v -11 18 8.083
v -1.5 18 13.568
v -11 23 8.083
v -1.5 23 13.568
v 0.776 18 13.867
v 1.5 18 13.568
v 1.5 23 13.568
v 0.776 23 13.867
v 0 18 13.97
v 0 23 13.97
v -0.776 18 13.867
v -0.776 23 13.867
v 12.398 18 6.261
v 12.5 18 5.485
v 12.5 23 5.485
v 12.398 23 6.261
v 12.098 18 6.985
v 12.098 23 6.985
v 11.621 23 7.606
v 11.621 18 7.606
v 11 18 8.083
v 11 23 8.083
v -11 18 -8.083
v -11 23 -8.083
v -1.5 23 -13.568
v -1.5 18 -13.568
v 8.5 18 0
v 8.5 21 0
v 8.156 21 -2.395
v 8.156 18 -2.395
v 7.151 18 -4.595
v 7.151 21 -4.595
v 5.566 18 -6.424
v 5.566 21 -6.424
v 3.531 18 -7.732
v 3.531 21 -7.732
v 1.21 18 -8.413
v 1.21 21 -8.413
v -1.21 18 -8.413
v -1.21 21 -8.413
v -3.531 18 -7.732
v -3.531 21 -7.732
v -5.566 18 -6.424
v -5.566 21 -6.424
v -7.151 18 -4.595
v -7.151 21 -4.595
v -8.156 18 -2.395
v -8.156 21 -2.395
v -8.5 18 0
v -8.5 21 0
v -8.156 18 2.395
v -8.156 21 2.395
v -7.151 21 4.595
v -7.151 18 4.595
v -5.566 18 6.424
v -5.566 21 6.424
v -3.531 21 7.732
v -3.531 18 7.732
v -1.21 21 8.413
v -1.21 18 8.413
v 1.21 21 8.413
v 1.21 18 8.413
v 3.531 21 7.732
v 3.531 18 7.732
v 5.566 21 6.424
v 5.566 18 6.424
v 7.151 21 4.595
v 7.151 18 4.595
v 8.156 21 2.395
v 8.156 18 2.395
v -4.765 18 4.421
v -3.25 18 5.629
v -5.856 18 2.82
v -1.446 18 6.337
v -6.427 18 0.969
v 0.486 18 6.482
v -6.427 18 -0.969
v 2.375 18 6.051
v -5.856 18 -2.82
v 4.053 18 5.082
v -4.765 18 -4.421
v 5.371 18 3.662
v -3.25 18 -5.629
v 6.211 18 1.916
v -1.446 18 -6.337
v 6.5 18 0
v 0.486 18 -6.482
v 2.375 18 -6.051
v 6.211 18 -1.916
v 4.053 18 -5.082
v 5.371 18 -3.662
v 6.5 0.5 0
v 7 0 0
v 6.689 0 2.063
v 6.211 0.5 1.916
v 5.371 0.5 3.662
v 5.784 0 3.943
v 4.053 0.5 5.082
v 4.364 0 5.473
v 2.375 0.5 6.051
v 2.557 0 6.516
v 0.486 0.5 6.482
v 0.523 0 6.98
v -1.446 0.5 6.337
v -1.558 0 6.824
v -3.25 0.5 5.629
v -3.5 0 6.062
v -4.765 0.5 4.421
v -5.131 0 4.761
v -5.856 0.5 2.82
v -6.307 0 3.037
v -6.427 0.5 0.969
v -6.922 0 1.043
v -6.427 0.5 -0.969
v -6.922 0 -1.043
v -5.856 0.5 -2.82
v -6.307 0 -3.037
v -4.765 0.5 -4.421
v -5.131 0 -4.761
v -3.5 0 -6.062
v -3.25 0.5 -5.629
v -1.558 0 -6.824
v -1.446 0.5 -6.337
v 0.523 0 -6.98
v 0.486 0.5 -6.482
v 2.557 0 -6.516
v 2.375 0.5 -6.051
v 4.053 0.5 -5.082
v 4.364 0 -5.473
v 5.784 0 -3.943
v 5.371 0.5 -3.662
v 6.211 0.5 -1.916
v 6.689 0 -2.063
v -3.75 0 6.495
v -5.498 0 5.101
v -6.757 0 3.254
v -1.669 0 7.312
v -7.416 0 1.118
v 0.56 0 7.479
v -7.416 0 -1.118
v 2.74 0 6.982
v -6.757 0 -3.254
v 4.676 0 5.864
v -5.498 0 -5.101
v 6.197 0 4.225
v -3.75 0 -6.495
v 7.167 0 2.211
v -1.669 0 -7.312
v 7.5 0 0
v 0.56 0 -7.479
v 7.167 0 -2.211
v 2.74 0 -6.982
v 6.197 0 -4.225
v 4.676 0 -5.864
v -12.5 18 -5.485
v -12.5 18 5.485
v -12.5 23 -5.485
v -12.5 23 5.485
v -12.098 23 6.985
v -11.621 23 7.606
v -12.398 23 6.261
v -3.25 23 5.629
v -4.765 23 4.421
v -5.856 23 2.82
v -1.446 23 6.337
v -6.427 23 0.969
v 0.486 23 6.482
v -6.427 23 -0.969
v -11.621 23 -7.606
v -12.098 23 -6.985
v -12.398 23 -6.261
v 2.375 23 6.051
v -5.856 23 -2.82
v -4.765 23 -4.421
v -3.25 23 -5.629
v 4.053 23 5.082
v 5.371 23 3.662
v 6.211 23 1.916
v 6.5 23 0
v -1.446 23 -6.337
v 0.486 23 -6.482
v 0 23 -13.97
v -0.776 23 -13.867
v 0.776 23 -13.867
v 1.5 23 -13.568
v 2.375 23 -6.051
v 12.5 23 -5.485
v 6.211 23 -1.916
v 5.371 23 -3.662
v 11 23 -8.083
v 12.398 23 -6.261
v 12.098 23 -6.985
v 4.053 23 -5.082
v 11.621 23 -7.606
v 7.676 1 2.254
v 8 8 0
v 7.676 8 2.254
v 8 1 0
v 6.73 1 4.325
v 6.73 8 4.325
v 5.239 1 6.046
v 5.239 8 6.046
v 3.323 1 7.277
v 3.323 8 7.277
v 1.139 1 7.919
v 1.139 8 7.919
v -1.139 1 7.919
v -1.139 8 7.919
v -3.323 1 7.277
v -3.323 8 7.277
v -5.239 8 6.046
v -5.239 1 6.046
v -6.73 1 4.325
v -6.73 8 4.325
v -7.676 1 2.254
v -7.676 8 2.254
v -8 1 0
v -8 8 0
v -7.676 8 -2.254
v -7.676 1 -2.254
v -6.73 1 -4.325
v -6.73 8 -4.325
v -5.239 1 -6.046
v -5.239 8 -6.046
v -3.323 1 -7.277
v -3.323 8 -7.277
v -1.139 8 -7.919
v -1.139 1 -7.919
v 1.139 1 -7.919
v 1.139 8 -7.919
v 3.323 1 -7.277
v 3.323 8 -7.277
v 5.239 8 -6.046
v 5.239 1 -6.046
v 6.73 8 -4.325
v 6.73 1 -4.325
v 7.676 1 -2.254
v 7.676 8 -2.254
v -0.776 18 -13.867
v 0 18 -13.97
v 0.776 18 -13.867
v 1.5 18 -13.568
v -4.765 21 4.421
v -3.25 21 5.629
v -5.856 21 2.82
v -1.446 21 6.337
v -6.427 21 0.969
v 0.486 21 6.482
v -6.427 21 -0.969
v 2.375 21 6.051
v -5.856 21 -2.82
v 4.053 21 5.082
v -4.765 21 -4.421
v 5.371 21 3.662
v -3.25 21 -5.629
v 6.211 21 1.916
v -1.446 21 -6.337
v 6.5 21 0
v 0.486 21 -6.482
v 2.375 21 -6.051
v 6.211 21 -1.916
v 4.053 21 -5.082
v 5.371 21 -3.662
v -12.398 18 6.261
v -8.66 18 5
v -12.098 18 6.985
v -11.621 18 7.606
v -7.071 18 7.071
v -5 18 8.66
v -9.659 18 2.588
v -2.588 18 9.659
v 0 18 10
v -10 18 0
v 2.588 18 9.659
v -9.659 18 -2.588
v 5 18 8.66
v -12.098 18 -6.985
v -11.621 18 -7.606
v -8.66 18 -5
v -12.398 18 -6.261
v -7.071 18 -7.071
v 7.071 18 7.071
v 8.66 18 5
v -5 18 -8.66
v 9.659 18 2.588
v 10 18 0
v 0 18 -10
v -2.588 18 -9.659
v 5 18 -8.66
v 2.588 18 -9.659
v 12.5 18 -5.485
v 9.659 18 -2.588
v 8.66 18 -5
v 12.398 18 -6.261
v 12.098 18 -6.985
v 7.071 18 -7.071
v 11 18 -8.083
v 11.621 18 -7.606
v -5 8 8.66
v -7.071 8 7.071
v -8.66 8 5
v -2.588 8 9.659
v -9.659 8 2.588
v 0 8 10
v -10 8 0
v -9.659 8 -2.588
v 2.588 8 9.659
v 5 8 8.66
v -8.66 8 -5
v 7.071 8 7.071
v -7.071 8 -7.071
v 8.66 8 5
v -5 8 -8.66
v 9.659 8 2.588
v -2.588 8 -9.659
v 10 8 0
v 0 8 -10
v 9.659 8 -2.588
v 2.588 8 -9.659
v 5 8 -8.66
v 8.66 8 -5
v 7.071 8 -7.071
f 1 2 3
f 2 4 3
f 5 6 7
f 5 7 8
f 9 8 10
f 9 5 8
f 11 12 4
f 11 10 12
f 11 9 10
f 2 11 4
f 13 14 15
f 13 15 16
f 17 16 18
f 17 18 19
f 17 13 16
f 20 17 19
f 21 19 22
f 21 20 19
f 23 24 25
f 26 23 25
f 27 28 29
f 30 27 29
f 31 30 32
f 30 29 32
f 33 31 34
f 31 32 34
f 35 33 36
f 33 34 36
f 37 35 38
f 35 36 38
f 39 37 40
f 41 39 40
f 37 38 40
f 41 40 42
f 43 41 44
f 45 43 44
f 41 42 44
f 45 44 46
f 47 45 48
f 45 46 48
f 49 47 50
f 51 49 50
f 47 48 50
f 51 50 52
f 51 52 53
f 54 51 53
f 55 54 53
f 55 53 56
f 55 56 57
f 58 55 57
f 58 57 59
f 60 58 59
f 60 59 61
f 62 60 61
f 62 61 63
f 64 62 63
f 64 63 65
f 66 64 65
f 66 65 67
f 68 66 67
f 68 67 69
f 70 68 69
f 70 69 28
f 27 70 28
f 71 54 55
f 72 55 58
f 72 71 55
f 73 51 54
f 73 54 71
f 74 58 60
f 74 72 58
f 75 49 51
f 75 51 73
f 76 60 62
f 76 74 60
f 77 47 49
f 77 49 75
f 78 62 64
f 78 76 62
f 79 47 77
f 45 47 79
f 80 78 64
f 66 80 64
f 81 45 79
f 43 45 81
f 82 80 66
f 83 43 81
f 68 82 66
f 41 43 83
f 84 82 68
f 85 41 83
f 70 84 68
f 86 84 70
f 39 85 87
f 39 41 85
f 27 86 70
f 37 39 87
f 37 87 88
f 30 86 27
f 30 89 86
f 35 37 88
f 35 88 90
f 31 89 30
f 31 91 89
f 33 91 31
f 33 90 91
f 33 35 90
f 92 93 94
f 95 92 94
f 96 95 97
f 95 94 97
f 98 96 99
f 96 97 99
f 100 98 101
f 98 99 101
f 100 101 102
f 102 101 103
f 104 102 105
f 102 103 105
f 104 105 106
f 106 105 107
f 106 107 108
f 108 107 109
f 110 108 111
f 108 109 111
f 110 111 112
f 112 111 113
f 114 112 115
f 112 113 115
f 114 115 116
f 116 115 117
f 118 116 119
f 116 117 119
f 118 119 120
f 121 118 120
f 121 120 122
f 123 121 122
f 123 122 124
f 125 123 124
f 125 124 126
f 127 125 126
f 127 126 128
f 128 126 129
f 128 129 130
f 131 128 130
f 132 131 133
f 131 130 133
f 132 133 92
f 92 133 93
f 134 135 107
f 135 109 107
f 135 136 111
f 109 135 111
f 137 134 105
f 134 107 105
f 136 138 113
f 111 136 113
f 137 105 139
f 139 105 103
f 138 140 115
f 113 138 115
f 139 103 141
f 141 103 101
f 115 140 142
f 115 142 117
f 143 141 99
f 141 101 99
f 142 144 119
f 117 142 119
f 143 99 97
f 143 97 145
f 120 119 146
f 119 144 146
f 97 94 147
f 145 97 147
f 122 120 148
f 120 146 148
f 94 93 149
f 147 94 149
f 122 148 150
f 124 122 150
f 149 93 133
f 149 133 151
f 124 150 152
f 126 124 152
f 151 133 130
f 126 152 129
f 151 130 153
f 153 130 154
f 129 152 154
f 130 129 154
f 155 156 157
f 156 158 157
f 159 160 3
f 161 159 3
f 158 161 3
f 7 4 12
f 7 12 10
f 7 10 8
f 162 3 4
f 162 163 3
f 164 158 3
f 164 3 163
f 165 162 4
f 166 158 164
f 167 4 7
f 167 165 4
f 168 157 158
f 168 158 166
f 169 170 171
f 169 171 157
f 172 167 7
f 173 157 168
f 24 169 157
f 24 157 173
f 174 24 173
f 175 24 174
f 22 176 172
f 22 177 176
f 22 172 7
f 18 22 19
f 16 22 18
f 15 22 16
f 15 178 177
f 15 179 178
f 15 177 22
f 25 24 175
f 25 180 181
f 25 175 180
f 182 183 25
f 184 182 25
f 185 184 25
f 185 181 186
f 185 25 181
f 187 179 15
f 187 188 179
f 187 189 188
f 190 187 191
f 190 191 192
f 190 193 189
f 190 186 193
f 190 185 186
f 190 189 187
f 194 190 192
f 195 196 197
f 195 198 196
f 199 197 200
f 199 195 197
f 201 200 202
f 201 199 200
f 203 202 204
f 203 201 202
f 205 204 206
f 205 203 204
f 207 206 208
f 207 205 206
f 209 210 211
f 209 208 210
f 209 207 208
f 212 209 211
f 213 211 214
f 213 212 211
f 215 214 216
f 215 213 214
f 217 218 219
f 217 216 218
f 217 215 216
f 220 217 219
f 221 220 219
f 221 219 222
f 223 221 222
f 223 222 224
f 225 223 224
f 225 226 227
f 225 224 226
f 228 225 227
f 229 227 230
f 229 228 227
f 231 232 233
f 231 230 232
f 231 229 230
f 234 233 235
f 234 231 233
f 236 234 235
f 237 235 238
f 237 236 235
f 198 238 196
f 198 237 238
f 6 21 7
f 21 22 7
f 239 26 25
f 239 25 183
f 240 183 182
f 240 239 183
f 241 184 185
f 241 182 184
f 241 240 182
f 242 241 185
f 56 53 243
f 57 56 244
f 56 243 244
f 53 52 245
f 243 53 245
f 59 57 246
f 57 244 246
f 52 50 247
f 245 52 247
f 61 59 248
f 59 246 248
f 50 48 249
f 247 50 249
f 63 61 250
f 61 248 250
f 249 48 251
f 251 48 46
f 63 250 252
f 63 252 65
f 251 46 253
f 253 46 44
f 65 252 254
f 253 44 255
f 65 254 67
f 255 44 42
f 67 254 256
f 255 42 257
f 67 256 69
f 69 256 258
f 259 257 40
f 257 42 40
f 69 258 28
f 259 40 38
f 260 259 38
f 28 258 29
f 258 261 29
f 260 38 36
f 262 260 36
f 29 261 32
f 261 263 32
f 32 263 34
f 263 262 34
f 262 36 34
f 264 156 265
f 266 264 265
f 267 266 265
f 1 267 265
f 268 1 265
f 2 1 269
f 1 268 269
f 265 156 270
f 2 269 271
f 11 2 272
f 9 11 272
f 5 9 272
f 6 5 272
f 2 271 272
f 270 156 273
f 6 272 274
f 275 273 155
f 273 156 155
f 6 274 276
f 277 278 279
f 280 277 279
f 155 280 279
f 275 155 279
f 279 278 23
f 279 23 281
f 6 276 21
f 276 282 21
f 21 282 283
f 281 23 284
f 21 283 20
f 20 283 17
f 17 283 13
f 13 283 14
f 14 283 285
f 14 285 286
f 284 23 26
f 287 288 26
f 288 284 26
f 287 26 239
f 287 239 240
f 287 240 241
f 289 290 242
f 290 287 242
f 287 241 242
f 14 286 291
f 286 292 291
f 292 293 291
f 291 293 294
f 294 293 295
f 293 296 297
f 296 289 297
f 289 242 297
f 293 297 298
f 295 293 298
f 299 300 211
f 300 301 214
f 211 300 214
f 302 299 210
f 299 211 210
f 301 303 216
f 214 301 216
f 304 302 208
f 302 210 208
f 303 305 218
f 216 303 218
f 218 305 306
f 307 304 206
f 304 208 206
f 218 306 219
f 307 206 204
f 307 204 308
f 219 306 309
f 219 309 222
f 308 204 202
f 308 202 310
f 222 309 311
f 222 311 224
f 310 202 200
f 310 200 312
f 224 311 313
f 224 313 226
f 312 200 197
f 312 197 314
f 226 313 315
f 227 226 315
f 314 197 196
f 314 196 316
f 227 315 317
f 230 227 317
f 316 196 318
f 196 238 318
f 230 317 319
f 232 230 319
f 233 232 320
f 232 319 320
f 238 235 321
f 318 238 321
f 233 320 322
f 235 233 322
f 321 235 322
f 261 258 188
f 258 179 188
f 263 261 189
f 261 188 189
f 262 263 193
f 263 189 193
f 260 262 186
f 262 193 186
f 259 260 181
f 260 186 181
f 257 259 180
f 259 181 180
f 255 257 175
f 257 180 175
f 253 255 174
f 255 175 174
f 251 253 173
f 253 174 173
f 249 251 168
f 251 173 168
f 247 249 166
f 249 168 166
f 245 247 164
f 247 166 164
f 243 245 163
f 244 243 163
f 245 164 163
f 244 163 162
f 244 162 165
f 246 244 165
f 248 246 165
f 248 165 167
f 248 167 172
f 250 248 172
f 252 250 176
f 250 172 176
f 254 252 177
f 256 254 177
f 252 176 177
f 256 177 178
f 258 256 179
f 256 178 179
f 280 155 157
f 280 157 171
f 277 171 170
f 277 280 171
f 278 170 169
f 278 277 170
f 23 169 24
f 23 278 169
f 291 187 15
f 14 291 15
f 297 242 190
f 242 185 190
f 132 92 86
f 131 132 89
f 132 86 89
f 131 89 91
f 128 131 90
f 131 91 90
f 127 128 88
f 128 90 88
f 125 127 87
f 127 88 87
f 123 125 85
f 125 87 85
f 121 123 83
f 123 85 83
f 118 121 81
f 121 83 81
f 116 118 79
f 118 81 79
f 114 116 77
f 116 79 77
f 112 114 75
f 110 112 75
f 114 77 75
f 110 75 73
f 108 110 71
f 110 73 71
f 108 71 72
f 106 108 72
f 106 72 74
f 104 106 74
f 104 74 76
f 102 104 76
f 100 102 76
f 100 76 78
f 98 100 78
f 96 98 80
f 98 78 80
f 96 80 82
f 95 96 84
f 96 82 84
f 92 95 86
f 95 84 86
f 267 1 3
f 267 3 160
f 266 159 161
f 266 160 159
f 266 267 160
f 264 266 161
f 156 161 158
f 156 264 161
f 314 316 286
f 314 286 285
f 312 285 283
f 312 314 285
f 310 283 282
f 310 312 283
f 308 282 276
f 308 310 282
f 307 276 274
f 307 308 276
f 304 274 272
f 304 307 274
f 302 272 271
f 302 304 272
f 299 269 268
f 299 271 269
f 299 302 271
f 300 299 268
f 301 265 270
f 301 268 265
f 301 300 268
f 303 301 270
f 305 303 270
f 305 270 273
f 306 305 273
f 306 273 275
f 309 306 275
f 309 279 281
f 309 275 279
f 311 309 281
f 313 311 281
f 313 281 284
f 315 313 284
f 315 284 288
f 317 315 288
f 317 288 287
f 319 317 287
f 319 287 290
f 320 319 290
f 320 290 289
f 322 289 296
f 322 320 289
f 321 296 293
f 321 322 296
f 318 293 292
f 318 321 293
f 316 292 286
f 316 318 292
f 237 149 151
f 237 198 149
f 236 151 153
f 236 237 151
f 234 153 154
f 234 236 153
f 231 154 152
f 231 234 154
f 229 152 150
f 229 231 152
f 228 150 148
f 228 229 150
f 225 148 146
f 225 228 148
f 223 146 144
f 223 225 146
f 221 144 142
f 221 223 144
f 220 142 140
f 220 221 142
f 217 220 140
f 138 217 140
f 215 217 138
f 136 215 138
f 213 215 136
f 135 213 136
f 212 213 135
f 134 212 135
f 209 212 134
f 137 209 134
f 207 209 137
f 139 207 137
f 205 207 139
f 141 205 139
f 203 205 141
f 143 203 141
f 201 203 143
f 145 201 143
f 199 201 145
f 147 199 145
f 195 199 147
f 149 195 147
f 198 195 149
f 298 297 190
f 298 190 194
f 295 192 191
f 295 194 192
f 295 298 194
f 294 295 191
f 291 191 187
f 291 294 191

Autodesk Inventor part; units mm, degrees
ref_plane "YZ Plane" through (0, 0, 0) normal (1, 0, 0) x (0, 1, 0)
ref_plane "XZ Plane" through (0, 0, 0) normal (0, 1, 0) x (-1, 0, 0)
ref_plane "XY Plane" through (0, 0, 0) normal (0, 0, 1) x (1, 0, 0)
sketch "Sketch1" plane through (0, 0, 0) normal (0, 0, 1) x (1, 0, 0)
  line L0 (-1, 0) -> (13, 0) projected
  line L1 (0, -2.3) -> (0, 29.9) projected
  line L2 (6.5, 0) -> (6.5, 18)
  line L3 (6.5, 18) -> (8.5, 18)
  line L4 (8.5, 18) -> (8.5, 21)
  line L5 (8.5, 21) -> (6.5, 21)
  line L6 (6.5, 21) -> (6.5, 23)
  line L7 (6.5, 23) -> (10, 23)
  line L8 (10, 23) -> (10, 8)
  line L9 (10, 8) -> (8, 8)
  line L10 (8, 8) -> (8, 0)
  line L11 (8, 0) -> (6.5, 0)
  point P0 (0, 0)
  dimension "d0" = 13
  dimension "d1" = 16
  dimension "d2" = 20
  dimension "d3" = 8
  dimension "d4" = 23
  dimension "d5" = 2
  dimension "d6" = 3
  dimension "d7" = 2
revolve "Revolution1" add sketch "Sketch1" angle 360 about axis through (0, -10, 0) along (0, 1, 0)
sketch "Sketch2" plane through (0, 23, 0) normal (0, 1, 0) x (1, 0, 0)
  circle A0 centre (0, 0) radius 10 projected
  circle A1 centre (0, 0) radius 6.5 projected
  line L0 (-12, 0) -> (16, 0) projected
  line L1 (0, 12) -> (0, -16) projected
  line L2 (0, -14.4338) -> (-12.5, -7.2169)
  line L3 (-12.5, -7.2169) -> (-12.5, 7.2169)
  line L4 (-12.5, 7.2169) -> (0, 14.4338)
  line L5 (0, 14.4338) -> (12.5, 7.2169)
  line L6 (12.5, 7.2169) -> (12.5, -7.2169)
  line L7 (12.5, -7.2169) -> (0, -14.4338)
  dimension "d9" = 25
extrude "Extrusion1" add sketch "Sketch2" against normal blind 5 contours L0 L6 L7 L1 A0 | A0 L1 L2 L3 L4 L5 L6 L0
fillet "Fillet1" radius 3 6 edges at (0, 20.5, 14.4338) (-12.5, 20.5, 7.2169) (-12.5, 20.5, -7.2169) (0, 20.5, -14.4338) (12.5, 20.5, -7.2169) (12.5, 20.5, 7.2169)
chamfer "Chamfer1" distance 0.5 angle 45 1 edges at (-6.5, 0, 0)
chamfer "Chamfer2" distance 0.5 distance2 1 1 edges at (-8, 0, 0) measured on face at (7.5214, 0, 1.1966)
thread "Thread1" size "M20x2.5" class "6g" standard "ANSI Metric M Profile" length 5 offset 3
properties part number "Packing Nut" material "Bronze, Soft Tin"
